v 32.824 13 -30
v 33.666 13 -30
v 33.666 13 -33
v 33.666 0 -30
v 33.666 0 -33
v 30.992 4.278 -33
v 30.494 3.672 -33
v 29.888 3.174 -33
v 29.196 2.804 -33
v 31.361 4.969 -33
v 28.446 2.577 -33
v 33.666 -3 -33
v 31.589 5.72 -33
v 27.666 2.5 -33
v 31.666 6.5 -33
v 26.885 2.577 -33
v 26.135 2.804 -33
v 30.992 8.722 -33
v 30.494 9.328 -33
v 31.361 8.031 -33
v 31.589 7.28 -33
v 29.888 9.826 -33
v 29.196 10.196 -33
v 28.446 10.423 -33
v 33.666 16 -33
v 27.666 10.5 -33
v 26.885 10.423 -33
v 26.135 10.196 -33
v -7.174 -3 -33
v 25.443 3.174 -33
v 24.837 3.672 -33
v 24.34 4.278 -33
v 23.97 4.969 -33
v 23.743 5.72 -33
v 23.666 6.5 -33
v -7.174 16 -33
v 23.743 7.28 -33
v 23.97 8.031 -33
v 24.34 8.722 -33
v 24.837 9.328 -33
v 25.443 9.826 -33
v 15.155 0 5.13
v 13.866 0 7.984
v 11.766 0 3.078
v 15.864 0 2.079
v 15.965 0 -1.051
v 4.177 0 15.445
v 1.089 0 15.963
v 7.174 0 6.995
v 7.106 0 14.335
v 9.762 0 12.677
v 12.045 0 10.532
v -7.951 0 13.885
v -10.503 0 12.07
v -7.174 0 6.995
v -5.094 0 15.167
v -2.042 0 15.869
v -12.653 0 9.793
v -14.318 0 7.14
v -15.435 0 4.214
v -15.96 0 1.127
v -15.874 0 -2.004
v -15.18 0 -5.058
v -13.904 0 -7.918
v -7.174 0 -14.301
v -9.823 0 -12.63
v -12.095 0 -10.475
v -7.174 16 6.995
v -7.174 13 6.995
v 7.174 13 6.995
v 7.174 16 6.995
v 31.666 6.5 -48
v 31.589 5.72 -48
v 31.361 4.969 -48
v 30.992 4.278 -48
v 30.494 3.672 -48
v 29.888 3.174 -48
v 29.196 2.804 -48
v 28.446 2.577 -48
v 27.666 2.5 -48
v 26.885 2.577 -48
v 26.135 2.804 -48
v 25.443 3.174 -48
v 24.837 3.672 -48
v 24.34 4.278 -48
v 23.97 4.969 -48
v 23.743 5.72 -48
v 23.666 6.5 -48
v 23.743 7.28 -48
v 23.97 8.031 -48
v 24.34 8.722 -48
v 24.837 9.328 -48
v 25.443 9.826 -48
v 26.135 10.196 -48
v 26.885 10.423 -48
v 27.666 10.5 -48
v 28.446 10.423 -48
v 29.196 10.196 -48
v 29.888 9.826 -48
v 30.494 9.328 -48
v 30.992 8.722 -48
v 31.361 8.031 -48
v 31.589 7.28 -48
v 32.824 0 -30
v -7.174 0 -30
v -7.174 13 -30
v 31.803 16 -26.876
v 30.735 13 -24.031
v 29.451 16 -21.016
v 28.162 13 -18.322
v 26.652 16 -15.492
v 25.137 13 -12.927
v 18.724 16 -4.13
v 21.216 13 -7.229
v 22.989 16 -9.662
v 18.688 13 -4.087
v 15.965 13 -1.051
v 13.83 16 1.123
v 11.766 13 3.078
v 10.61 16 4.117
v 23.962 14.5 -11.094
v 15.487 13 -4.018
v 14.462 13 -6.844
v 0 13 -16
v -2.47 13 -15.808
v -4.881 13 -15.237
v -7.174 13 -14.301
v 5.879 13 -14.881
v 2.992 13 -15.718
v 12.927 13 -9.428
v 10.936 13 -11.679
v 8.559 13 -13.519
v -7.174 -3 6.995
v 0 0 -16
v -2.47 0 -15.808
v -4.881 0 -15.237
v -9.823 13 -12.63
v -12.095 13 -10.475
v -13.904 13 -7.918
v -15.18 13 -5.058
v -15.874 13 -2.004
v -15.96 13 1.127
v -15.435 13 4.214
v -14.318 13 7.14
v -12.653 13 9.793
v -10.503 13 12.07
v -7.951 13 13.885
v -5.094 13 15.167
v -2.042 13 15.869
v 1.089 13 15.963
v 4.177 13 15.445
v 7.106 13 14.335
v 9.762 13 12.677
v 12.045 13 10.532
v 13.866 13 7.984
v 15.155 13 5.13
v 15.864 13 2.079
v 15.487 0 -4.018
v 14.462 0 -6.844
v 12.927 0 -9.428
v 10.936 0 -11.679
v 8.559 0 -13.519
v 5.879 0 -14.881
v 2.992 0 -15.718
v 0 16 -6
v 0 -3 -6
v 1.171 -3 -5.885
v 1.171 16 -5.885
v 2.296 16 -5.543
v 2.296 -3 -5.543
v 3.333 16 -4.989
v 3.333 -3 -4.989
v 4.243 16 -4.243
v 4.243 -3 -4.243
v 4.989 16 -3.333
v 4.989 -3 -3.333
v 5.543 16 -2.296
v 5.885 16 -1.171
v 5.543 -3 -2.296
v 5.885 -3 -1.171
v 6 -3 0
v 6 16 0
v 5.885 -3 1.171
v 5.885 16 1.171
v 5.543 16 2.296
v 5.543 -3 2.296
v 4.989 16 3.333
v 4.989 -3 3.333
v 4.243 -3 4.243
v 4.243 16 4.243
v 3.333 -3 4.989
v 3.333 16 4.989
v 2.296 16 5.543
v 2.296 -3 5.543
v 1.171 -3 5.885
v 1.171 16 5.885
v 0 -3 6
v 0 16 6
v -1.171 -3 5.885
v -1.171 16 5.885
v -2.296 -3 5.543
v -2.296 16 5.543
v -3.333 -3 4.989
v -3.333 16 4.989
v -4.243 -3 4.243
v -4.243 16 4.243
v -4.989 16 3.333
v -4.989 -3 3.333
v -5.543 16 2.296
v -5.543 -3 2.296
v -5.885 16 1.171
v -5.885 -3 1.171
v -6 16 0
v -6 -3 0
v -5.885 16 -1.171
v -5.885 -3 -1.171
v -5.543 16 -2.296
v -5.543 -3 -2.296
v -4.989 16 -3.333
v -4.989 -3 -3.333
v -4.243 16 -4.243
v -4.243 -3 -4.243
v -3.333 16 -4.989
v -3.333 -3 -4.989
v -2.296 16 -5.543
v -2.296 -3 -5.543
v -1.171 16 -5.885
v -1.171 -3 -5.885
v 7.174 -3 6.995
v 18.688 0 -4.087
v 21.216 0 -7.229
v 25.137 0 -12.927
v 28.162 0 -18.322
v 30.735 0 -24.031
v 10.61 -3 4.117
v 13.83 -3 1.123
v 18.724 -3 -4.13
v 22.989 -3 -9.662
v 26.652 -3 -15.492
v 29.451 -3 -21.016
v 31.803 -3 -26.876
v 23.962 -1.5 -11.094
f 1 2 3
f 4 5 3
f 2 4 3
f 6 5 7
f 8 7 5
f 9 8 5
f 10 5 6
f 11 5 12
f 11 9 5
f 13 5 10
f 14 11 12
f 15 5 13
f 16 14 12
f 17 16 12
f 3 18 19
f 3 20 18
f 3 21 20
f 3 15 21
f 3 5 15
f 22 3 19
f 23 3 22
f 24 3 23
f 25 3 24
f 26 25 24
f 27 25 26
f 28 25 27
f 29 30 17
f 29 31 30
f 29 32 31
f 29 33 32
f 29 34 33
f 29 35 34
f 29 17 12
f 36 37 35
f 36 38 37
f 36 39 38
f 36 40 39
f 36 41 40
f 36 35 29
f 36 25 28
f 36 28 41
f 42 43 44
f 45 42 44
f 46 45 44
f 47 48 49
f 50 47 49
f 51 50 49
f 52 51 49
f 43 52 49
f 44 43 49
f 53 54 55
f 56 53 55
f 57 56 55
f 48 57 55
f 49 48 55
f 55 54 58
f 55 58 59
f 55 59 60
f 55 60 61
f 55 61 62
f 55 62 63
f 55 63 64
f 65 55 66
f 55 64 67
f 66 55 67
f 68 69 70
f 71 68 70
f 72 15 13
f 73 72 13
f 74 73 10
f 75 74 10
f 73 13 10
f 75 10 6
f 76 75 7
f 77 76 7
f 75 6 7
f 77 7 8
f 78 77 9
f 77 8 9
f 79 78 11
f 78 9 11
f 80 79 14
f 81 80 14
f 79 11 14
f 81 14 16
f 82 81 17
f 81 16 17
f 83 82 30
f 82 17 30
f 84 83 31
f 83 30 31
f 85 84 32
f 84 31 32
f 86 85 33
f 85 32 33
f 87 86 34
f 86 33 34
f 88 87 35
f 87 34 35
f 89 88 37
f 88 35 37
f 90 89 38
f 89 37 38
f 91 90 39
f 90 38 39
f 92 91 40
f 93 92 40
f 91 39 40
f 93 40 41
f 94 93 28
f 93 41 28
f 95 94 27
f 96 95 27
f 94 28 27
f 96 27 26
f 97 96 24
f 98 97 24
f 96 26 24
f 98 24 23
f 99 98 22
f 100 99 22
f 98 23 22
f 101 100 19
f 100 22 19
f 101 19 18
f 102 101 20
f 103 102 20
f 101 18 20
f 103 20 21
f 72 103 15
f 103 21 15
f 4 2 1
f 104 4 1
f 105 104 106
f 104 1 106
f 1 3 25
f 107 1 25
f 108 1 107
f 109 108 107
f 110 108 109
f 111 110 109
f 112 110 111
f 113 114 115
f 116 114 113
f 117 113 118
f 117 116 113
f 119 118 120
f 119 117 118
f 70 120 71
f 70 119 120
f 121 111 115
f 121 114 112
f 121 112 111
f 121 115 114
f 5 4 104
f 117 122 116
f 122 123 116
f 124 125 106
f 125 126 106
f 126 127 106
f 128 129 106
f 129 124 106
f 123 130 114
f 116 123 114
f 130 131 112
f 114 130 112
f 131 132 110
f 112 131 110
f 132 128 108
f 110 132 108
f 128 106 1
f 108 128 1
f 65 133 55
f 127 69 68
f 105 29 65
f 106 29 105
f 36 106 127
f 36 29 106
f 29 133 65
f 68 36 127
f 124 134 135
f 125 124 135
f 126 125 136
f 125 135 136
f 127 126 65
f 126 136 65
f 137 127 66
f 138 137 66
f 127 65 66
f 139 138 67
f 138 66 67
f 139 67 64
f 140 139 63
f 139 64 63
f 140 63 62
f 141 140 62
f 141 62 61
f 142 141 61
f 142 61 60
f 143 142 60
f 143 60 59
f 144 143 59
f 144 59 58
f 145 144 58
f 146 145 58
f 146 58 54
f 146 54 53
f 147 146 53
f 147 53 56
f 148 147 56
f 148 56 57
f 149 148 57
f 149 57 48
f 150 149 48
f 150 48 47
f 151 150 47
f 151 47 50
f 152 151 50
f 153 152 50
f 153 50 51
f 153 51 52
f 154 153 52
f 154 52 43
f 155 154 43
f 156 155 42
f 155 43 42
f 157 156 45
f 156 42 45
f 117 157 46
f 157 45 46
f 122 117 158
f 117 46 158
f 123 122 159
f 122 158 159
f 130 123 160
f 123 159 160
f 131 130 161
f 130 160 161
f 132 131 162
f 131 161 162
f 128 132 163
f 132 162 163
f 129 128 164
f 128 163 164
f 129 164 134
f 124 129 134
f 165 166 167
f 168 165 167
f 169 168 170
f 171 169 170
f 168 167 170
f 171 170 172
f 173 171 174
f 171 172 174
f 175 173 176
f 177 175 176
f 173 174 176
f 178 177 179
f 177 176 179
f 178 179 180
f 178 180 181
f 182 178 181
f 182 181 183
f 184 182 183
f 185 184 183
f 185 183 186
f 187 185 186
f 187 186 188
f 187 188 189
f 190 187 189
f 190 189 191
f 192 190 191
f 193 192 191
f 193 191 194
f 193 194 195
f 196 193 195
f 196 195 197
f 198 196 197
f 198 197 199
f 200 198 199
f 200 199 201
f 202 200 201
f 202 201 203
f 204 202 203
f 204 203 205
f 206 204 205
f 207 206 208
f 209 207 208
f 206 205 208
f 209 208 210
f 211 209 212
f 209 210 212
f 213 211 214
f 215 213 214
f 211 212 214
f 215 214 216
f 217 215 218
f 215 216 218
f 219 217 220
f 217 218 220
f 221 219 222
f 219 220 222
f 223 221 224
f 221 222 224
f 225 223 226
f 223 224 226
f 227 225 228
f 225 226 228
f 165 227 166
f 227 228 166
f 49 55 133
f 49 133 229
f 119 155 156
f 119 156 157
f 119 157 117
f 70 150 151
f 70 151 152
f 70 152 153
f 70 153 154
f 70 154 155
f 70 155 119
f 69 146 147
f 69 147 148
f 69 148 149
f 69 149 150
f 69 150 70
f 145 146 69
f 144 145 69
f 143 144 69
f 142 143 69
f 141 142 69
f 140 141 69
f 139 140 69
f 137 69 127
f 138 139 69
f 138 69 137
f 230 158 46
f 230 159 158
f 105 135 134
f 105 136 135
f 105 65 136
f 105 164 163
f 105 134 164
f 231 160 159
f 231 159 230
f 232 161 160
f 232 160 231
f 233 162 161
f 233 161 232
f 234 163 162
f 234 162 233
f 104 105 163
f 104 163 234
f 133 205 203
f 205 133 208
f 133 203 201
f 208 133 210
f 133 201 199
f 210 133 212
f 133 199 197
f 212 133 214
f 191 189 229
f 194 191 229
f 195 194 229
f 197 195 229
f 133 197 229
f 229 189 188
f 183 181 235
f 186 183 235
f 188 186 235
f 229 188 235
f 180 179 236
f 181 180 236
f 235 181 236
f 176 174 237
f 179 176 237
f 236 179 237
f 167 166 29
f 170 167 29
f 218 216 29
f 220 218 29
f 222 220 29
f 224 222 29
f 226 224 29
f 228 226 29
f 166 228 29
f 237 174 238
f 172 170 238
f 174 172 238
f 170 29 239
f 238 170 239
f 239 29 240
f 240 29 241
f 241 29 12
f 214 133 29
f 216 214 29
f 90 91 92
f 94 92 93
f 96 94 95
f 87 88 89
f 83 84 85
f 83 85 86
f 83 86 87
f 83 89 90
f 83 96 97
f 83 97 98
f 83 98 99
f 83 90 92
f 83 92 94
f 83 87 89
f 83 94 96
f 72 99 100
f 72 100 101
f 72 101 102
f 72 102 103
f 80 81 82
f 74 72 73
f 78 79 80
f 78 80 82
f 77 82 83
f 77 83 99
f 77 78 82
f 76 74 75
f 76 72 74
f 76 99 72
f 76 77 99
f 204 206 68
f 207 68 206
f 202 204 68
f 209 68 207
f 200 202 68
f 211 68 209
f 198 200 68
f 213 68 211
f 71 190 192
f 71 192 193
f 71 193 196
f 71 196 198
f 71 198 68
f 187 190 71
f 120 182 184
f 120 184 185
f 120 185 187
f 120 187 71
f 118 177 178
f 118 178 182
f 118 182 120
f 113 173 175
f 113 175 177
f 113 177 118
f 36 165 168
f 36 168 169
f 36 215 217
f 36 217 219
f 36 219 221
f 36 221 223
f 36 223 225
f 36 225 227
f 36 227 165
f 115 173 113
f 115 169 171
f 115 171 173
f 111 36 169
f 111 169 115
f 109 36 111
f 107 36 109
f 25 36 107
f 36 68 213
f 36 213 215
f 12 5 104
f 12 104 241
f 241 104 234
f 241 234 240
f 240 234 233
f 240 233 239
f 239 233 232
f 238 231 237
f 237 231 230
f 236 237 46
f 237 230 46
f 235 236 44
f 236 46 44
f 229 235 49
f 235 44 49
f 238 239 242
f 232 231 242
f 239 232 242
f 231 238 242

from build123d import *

# Parameters (mm, degrees)
SKETCH_1_R          = 16
SKETCH_1_R_2        = 6
EXTRUDE_1_DEPTH     = 13
EXTRUDE_2_DEPTH     = 3
SKETCH_3_W          = 40.839919316
SKETCH_3_H          = 13
EXTRUDE_3_DEPTH     = 3
SKETCH_4_R          = 4
EXTRUDE_4_DEPTH     = 15
SKETCH_5_R          = 6
CUT_EXTRUDE_1_DEPTH = 30


with BuildPart() as part:
    # 草图1 → 凸台-拉伸1 (new body)
    with BuildSketch(Plane(origin=(0, 0, 0), x_dir=(1, 0, 0), z_dir=(0, 1, 0))):
        with Locations(Location((0, 0, 0), (0, 0, 90))):
            Circle(SKETCH_1_R)
        with Locations(Location((0, 0, 0), (0, 0, 90))):
            Circle(SKETCH_1_R_2, mode=Mode.SUBTRACT)
    extrude(amount=EXTRUDE_1_DEPTH)

    # 草图2 → 凸台-拉伸2 (add)
    with BuildSketch(Plane(origin=(0, 13, 0), x_dir=(1, 0, 0), z_dir=(0, 1, 0))):
        with BuildLine():
            Line((-7.174258512, -6.994775102), (7.174258512, -6.994775102))
            add(Edge.make_bspline(
                [(33.665660804, 33), (27.50458158, 9.184496857), (7.174258512, -6.994775102)],
                knots=[0, 0, 0, 1, 1, 1], degree=2))
            Line((33.665660804, 33), (7.174258512, 33))
            Line((7.174258512, 33), (-7.174258512, 33))
            Line((-7.174258512, 33), (-7.174258512, -6.994775102))
        make_face()
    extrude_2 = extrude(amount=EXTRUDE_2_DEPTH)

    # 镜向1: 凸台-拉伸2 across plane
    add(extrude_2.mirror(Plane.ZX.offset(6.5)))

    # 草图3 → 凸台-拉伸3 (add)
    with BuildSketch(Plane(origin=(0, 0, -33), x_dir=(-1, 0, 0), z_dir=(0, 0, -1))):
        with Locations((-13.245701146, 6.5)):
            Rectangle(SKETCH_3_W, SKETCH_3_H)
    extrude(amount=-EXTRUDE_3_DEPTH)

    # 草图4 → 凸台-拉伸4 (add)
    with BuildSketch(Plane(origin=(0, 0, -33), x_dir=(-1, 0, 0), z_dir=(0, 0, -1))):
        with Locations(Location((-27.665660804, 6.5, 0), (0, 0, 180))):
            Circle(SKETCH_4_R)
    extrude(amount=EXTRUDE_4_DEPTH)

    # 草图5 → 切除-拉伸1 (cut)
    with BuildSketch(Plane.XZ.offset(3)):
        with Locations(Location((0, 0, 0), (0, 0, 270))):
            Circle(SKETCH_5_R)
    extrude(amount=-CUT_EXTRUDE_1_DEPTH, mode=Mode.SUBTRACT)


solid = part.part
